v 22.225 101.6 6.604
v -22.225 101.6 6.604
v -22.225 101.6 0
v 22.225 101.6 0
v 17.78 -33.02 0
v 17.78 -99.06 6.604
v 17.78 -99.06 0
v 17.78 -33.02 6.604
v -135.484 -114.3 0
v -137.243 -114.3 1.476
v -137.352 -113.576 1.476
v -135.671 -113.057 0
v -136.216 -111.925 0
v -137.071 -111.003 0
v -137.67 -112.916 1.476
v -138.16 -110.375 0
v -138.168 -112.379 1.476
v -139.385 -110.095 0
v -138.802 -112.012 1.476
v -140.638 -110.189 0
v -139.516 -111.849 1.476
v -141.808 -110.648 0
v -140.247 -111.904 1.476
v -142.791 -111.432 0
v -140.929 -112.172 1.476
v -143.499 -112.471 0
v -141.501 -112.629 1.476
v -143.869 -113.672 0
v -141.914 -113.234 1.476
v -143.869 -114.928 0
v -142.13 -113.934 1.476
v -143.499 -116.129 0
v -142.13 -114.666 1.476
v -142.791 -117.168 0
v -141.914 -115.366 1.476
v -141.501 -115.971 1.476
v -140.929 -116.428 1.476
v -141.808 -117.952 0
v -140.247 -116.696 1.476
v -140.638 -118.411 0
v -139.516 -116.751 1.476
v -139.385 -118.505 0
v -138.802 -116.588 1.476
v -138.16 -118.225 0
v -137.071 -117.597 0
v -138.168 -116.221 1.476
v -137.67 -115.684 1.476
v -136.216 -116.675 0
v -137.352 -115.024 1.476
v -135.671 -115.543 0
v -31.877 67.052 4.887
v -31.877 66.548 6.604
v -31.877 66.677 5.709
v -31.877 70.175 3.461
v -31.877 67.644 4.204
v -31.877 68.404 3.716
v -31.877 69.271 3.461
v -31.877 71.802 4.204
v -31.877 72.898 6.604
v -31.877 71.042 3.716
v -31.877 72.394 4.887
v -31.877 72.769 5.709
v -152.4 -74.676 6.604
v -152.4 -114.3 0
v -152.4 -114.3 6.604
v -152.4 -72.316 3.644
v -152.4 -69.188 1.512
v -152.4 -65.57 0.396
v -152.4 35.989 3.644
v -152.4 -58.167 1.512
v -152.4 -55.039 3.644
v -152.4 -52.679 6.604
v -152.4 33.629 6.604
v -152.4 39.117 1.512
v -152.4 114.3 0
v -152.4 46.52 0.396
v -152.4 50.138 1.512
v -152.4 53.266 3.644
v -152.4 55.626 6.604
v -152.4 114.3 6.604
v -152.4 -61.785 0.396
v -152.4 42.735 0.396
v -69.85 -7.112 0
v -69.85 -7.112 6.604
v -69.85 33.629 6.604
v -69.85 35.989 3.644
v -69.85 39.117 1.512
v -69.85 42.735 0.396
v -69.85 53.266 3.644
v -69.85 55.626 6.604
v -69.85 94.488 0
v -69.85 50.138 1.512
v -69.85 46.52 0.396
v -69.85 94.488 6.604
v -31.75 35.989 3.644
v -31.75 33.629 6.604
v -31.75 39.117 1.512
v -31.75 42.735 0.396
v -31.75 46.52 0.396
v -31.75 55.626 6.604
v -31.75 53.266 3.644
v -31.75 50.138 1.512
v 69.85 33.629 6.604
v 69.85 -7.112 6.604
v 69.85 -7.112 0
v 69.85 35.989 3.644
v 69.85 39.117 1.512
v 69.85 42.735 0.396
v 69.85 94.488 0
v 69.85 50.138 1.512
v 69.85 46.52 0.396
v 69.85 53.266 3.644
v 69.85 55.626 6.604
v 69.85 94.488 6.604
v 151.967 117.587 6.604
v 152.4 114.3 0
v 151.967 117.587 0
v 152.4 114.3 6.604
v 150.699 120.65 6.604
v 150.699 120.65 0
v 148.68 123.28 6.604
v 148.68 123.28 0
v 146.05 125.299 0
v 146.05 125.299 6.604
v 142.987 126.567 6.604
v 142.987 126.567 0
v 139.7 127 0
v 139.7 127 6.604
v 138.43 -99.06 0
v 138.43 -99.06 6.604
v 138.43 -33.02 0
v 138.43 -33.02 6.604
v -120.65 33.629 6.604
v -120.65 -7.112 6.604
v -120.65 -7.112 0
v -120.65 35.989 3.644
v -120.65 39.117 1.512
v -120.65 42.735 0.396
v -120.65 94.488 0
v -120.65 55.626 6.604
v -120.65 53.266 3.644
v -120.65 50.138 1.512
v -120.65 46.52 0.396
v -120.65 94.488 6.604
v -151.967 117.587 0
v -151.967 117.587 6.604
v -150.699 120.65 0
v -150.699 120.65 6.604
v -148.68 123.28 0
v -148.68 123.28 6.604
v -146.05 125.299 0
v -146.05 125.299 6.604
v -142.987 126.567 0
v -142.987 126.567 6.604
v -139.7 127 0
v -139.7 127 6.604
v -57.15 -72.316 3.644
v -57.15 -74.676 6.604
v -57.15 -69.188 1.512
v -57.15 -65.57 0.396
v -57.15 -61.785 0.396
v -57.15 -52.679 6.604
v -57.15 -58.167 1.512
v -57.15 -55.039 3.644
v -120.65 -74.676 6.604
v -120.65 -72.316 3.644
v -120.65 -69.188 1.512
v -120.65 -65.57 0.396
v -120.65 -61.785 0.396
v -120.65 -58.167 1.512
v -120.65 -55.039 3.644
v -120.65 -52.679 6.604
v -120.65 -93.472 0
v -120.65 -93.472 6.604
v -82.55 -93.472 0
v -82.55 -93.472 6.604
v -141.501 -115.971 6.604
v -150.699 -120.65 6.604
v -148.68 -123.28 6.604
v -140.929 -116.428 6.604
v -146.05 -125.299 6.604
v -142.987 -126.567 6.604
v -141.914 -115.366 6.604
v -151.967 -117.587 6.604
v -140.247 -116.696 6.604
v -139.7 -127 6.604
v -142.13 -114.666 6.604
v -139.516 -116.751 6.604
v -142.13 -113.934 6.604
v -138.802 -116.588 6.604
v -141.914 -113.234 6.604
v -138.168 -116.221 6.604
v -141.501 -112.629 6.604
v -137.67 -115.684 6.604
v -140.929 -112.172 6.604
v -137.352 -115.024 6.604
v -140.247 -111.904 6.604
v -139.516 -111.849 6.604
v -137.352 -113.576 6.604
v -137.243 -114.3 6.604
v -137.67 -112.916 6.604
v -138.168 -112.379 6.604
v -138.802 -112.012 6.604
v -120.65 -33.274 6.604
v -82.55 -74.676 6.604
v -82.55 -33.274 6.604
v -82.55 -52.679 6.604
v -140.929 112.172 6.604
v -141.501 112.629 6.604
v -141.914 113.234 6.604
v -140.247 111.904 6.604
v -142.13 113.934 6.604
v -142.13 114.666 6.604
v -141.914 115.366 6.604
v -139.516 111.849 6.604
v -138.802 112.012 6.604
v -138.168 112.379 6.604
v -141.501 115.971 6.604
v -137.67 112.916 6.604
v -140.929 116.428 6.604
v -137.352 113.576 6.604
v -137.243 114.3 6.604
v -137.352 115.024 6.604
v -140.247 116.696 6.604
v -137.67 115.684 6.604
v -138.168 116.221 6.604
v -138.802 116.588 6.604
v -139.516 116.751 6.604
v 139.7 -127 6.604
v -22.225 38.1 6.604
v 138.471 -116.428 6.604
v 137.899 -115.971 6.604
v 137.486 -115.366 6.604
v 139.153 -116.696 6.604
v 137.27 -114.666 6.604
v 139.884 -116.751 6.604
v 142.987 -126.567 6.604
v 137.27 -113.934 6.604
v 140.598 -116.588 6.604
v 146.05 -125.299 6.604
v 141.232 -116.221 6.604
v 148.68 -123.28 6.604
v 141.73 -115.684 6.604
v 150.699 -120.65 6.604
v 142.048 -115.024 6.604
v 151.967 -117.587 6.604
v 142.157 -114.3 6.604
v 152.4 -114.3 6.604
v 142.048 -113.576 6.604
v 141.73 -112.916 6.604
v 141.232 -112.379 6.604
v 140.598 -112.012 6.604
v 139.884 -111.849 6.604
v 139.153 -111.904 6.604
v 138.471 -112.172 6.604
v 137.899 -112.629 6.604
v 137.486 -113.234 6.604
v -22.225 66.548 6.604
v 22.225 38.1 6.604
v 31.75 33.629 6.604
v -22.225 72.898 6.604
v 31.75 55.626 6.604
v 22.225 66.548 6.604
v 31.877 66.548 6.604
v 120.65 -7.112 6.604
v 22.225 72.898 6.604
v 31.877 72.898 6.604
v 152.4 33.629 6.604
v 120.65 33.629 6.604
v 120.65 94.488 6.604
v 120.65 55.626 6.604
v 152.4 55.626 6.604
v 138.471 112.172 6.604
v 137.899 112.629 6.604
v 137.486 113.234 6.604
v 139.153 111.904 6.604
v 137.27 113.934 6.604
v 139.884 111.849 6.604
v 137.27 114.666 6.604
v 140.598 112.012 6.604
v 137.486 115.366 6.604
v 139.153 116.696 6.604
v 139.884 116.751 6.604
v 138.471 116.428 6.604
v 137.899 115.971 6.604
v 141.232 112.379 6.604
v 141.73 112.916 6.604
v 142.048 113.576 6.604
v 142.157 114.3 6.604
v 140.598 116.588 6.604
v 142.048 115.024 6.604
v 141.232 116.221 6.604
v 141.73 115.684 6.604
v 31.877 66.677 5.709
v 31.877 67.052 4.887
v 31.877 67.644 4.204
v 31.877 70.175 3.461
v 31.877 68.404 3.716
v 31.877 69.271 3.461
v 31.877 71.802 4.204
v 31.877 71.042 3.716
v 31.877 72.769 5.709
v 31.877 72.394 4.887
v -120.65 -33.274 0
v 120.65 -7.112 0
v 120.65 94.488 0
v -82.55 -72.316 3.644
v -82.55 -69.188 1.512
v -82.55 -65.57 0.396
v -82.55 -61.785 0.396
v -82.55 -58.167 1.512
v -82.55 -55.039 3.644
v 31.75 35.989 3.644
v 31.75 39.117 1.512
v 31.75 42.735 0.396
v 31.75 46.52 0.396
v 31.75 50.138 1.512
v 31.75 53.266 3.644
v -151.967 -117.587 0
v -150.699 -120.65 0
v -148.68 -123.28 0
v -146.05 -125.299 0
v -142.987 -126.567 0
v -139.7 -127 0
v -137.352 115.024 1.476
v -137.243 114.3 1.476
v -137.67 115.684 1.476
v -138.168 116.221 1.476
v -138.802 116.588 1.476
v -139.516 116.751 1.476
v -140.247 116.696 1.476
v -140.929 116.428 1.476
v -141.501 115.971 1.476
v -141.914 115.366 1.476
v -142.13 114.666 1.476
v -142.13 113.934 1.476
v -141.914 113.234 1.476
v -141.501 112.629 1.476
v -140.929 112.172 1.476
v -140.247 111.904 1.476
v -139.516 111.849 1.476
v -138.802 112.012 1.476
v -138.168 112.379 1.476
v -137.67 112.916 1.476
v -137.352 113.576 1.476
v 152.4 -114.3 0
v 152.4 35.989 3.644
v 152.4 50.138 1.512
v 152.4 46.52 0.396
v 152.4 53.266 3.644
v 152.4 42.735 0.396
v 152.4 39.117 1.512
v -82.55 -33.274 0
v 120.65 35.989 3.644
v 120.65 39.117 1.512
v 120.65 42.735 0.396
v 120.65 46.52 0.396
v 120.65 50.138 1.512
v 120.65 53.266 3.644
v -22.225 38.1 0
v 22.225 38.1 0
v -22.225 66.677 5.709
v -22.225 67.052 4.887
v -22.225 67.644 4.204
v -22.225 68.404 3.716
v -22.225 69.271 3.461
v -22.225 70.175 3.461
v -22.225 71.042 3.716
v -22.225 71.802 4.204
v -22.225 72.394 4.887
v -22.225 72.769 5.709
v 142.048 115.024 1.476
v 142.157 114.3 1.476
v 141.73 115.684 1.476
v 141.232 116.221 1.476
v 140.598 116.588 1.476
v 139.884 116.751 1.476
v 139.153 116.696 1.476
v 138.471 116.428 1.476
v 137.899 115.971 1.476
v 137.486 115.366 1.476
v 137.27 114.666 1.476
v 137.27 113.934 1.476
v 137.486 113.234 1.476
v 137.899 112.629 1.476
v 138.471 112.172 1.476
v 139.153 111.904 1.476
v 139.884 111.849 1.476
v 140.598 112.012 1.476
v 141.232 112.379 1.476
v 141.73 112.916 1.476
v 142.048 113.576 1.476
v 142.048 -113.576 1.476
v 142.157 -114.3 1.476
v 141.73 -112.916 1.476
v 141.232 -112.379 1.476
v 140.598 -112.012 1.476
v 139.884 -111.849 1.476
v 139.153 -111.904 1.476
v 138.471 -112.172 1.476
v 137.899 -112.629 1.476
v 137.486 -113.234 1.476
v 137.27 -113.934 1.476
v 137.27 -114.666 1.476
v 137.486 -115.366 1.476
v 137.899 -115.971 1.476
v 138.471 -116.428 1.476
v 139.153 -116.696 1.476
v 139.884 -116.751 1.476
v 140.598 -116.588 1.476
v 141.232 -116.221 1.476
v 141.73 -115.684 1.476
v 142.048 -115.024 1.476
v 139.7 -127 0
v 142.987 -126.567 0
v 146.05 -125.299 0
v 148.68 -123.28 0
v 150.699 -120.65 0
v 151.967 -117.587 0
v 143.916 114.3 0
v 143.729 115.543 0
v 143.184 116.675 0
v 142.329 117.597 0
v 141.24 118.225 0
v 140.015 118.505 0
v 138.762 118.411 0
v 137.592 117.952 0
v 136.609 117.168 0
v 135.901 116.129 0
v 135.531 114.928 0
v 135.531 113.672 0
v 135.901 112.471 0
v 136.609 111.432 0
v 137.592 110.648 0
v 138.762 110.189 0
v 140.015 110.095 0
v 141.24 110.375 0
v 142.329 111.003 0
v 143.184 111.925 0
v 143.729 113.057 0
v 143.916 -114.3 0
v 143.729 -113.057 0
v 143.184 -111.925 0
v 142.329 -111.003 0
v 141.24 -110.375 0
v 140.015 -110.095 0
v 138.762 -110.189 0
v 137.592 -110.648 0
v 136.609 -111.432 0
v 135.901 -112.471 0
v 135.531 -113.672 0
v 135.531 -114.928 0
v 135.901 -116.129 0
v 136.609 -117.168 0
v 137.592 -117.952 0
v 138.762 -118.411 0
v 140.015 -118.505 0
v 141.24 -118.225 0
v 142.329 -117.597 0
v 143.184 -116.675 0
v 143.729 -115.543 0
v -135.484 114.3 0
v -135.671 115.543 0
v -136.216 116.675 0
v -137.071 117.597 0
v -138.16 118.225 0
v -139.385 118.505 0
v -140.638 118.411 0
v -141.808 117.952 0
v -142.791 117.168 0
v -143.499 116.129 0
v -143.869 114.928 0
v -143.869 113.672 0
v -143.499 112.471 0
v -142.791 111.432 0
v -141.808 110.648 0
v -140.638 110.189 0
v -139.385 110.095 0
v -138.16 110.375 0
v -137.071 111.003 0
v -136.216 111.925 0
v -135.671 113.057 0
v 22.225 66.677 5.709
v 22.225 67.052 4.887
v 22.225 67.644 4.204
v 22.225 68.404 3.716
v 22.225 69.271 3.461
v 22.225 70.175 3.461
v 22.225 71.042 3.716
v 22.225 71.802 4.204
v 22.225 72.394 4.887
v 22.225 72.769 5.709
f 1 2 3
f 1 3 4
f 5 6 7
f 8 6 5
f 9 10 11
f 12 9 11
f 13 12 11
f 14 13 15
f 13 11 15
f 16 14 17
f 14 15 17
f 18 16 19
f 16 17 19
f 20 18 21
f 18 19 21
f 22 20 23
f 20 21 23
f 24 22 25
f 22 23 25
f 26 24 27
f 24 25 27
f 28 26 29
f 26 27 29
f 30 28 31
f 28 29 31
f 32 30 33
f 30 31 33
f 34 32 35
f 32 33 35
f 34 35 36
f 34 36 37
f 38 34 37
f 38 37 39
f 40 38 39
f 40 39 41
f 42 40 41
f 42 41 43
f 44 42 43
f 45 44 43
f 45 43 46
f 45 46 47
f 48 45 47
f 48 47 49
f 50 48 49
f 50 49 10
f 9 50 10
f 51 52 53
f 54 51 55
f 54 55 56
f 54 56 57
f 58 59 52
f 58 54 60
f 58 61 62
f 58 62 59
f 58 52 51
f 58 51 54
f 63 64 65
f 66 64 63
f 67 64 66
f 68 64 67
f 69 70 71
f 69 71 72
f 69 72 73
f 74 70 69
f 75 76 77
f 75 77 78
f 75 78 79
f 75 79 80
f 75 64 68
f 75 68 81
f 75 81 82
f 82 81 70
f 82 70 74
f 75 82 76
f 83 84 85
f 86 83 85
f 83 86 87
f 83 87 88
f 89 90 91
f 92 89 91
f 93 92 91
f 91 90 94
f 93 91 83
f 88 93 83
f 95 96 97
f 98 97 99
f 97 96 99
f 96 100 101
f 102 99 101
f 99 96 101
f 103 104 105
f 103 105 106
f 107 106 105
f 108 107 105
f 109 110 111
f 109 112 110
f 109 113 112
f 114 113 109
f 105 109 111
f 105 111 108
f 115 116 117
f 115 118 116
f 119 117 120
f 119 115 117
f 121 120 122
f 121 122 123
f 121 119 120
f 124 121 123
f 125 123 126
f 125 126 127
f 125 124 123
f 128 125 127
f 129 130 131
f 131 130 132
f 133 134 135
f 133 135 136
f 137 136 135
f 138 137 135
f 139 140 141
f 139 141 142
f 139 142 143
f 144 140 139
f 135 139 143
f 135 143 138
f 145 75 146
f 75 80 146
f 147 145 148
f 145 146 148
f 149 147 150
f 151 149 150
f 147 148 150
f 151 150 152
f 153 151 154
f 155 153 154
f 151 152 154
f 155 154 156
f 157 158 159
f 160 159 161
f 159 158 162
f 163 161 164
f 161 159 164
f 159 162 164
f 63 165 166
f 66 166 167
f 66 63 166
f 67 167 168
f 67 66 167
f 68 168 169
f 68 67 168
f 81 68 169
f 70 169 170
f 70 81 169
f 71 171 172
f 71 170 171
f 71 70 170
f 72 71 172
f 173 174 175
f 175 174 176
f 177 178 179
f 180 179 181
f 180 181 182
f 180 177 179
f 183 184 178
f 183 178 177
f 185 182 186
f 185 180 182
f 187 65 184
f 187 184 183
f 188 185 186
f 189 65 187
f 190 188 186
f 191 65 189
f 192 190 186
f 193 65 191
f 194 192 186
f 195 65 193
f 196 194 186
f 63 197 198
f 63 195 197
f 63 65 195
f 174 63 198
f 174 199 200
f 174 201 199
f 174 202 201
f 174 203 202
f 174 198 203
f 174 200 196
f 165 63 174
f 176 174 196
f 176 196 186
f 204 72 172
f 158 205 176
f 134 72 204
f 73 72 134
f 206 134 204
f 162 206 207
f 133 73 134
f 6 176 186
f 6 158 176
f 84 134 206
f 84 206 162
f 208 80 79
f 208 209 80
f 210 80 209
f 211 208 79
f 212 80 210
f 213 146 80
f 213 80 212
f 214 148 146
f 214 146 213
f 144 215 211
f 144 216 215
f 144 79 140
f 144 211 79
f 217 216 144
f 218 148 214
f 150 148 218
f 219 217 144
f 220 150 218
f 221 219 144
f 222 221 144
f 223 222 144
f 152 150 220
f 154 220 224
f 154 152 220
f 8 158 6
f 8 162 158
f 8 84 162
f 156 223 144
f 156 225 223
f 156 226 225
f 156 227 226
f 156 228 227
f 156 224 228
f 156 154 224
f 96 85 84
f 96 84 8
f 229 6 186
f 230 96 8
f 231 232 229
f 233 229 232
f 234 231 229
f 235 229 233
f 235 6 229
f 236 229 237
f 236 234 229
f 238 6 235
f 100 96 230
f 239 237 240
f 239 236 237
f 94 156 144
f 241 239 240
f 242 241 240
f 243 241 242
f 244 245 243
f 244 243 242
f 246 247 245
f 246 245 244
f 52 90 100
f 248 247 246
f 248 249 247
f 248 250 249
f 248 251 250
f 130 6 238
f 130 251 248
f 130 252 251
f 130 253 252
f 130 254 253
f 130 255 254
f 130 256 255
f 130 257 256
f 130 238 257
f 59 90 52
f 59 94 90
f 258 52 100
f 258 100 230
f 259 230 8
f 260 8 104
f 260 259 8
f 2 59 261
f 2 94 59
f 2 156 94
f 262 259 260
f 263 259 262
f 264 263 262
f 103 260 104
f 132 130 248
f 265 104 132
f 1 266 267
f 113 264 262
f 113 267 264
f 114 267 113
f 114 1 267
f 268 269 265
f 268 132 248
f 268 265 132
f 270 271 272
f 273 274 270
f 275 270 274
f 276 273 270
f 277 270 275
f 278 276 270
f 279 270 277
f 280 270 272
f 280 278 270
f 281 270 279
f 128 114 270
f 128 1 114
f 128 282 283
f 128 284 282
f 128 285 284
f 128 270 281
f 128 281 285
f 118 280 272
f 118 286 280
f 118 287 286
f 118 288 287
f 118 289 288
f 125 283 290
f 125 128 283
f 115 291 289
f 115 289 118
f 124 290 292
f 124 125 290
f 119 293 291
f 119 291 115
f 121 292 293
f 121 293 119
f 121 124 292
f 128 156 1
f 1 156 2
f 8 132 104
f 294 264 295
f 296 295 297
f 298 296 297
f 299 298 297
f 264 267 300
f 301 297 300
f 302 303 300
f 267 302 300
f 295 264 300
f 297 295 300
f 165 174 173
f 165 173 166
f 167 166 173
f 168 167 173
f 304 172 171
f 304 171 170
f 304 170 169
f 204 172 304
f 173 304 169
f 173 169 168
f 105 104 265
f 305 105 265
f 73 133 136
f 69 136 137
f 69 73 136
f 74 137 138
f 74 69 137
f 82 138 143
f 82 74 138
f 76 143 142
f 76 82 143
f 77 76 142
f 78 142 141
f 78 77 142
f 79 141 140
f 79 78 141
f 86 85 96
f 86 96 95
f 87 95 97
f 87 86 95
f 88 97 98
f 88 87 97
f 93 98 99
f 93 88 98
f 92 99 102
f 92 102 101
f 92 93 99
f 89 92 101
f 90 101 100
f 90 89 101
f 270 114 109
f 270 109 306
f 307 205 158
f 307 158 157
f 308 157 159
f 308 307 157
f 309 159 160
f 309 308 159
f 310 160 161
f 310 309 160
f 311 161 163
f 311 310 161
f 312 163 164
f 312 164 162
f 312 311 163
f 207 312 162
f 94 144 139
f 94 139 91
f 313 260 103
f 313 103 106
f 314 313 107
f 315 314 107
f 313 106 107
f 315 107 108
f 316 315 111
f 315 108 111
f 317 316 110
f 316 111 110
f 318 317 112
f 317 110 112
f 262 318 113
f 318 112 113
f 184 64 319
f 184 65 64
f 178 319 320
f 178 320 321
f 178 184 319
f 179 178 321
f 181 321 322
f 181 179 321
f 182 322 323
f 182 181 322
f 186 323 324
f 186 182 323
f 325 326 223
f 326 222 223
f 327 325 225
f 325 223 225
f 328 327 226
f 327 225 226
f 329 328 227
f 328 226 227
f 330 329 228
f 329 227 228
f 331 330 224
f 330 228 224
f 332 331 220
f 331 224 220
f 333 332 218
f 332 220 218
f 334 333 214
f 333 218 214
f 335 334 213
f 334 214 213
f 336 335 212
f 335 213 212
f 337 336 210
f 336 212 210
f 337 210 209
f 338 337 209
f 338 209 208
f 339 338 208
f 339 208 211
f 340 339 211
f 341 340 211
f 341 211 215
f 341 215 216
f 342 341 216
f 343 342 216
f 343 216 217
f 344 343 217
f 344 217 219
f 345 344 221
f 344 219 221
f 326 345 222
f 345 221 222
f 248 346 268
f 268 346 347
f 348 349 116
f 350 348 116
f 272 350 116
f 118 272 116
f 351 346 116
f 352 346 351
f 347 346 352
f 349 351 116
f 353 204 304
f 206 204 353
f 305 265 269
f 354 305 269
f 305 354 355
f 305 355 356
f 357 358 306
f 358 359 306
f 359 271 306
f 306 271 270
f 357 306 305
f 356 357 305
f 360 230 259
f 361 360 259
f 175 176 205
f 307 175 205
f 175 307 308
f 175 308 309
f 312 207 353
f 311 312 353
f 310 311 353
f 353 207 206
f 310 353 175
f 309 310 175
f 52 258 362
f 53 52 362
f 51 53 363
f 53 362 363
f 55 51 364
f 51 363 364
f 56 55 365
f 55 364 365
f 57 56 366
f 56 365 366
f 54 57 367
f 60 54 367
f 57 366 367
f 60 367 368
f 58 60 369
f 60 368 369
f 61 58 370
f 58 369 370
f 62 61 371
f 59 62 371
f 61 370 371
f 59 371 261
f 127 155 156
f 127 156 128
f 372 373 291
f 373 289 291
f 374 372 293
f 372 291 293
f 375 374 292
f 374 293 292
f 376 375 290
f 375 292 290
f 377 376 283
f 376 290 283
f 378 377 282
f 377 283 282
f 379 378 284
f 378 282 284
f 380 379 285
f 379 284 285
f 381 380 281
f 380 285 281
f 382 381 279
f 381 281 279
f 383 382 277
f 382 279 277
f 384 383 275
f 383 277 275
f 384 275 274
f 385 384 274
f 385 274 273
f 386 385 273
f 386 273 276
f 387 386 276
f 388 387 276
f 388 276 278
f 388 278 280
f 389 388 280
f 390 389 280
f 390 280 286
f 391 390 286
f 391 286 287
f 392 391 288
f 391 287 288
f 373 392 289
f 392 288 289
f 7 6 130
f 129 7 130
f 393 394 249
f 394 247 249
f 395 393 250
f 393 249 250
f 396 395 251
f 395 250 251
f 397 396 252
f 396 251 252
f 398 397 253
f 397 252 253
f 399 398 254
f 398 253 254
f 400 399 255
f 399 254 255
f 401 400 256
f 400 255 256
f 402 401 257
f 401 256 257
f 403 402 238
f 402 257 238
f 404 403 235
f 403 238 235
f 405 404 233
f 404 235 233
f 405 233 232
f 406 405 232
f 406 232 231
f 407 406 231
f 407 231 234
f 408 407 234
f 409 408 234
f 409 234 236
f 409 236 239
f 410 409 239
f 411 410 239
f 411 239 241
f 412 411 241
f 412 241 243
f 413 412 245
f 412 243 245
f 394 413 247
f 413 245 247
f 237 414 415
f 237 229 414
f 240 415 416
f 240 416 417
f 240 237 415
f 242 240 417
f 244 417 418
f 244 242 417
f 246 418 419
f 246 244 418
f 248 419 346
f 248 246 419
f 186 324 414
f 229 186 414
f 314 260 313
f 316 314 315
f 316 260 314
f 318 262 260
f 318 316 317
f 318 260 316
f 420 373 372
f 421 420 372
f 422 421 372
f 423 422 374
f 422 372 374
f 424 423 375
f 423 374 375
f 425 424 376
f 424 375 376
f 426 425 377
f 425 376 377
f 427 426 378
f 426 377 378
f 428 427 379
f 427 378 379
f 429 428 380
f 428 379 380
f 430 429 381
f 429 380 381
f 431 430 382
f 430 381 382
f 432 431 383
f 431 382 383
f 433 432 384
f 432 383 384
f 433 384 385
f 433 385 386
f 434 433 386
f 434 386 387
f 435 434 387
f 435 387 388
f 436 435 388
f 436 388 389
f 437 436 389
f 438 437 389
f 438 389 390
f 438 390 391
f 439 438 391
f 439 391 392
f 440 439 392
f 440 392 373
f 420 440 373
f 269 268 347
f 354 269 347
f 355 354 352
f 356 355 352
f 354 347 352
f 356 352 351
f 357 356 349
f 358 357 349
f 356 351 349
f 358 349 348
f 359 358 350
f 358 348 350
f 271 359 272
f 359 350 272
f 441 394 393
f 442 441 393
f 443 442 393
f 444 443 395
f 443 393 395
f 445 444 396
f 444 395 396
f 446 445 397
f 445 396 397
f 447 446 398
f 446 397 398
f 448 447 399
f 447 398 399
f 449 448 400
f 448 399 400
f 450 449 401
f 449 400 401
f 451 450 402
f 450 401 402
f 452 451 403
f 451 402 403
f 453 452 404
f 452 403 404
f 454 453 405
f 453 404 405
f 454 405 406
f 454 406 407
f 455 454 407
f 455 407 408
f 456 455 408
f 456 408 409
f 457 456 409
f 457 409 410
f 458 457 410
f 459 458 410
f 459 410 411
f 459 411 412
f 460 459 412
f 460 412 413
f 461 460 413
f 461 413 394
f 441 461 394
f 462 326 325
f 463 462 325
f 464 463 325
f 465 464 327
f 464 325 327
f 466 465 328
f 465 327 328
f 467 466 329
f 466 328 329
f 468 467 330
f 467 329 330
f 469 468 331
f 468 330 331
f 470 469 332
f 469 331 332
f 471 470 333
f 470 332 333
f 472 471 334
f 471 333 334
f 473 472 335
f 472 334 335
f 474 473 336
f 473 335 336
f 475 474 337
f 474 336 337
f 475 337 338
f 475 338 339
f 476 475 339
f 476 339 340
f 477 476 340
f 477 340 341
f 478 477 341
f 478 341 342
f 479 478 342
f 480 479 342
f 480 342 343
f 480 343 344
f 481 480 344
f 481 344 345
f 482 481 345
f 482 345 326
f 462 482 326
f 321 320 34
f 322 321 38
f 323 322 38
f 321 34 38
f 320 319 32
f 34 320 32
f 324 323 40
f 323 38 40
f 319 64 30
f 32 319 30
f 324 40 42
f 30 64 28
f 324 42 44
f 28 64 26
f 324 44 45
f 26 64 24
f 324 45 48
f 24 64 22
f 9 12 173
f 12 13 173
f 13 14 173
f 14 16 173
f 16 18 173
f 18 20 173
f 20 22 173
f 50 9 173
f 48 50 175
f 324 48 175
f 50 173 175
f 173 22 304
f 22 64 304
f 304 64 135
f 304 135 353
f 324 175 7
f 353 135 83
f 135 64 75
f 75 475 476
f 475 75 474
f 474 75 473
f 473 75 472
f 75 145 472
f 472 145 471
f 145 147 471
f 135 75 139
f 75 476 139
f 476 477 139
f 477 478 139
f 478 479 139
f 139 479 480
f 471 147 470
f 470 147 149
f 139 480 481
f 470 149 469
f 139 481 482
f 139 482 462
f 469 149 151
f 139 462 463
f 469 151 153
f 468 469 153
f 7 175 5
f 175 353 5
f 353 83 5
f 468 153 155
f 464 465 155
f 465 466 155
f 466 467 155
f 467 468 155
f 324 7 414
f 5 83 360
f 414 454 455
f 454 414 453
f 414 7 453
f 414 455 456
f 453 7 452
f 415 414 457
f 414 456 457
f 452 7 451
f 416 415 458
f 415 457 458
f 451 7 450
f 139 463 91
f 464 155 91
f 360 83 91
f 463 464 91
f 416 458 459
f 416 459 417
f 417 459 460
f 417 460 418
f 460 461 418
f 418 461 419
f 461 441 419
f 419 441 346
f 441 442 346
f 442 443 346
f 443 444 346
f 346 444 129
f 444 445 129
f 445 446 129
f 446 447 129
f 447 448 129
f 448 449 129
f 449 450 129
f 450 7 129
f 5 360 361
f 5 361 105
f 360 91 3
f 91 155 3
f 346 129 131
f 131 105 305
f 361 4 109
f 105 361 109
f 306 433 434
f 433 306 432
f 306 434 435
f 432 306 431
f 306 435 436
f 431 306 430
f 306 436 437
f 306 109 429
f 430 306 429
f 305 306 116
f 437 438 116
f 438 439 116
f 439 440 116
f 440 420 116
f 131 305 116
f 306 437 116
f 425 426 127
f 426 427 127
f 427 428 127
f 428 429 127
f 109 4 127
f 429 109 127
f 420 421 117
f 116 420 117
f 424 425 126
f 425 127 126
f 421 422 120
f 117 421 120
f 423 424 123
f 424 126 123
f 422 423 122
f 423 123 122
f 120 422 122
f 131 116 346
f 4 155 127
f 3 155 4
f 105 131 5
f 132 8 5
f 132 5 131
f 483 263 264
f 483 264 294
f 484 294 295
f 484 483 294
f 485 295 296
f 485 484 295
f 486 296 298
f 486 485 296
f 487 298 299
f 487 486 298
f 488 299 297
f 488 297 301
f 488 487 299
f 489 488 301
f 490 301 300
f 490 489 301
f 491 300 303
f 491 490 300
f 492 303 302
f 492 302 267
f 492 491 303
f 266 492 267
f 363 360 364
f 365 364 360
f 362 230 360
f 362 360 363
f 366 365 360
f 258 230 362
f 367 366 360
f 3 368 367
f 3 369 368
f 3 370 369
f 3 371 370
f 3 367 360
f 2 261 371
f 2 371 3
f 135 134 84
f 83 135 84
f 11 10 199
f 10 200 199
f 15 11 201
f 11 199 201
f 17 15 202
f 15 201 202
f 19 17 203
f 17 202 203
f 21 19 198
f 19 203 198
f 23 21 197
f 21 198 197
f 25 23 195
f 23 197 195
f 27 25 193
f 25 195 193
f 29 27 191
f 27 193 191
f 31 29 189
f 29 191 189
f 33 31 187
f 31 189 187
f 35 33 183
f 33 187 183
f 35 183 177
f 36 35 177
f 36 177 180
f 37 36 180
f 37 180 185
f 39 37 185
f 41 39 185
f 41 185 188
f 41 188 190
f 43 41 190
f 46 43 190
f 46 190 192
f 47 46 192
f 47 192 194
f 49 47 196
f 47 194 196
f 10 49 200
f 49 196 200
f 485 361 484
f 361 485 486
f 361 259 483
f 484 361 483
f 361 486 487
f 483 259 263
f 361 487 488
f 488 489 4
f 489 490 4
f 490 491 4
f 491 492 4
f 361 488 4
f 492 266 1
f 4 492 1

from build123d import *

# Parameters (mm, degrees)
SKETCH1_W                                         = 304.8
SKETCH1_H                                         = 254
BOSS_EXTRUDE1_DEPTH                               = 6.604
FILLET1_R                                         = 12.7
SKETCH6_W                                         = 50.8
SKETCH6_H                                         = 101.6
SKETCH6_W_2                                       = 44.45
SKETCH6_H_2                                       = 63.5
SKETCH6_W_3                                       = 38.1
SKETCH6_H_3                                       = 60.198
SKETCH6_W_4                                       = 120.65
SKETCH6_H_4                                       = 66.04
CUT_EXTRUDE1_DEPTH                                = 7.62
CUT_EXTRUDE2_DEPTH                                = 120.65
CUT_EXTRUDE3_DEPTH                                = 95.25
CUT_EXTRUDE4_DEPTH                                = 9.652
CSK_FOR_8_FLAT_HEAD_MACHINE_SCREW_100_D           = 4.9149
CSK_FOR_8_FLAT_HEAD_MACHINE_SCREW_100_DEPTH       = 10.668
CSK_FOR_8_FLAT_HEAD_MACHINE_SCREW_100_CSINK_D     = 8.4328
CSK_FOR_8_FLAT_HEAD_MACHINE_SCREW_100_CSINK_ANGLE = 100
CSK_FOR_8_FLAT_HEAD_MACHINE_SCREW_100_TIP         = 1.476584928


with BuildPart() as part:
    # Sketch1 → Boss-Extrude1 (new body)
    with BuildSketch(Plane.XY):
        Rectangle(SKETCH1_W, SKETCH1_H)
    extrude(amount=BOSS_EXTRUDE1_DEPTH)

    # Fillet1
    fillet1_edges = [part.edges().sort_by_distance(p)[0] for p in [
        (-152.4, 127, 3.302),
        (152.4, 127, 3.302),
        (152.4, -127, 3.302),
        (-152.4, -127, 3.302),
    ]]
    fillet(fillet1_edges, radius=FILLET1_R)

    # Sketch6 → Cut-Extrude1 (cut)
    with BuildSketch(Plane.XY.offset(6.604)):
        with Locations((-95.25, 43.688)):
            Rectangle(SKETCH6_W, SKETCH6_H)
        with Locations((0, 69.85)):
            Rectangle(SKETCH6_W_2, SKETCH6_H_2)
        with Locations((-101.6, -63.373)):
            Rectangle(SKETCH6_W_3, SKETCH6_H_3)
        with Locations((95.25, 43.688)):
            Rectangle(SKETCH6_W, SKETCH6_H)
        with Locations((78.105, -66.04)):
            Rectangle(SKETCH6_W_4, SKETCH6_H_4)
    extrude(amount=-CUT_EXTRUDE1_DEPTH, mode=Mode.SUBTRACT)

    # Sketch9 → Cut-Extrude2 (cut)
    with BuildSketch(Plane.ZY.offset(152.4)):
        with BuildLine():
            Line((6.604, 55.626), (6.604, 33.628954744))
            ThreePointArc((6.604, 33.628954744), (0.254, 44.627477372), (6.604, 55.626))
        make_face()
    cut_extrude2 = extrude(amount=-CUT_EXTRUDE2_DEPTH, mode=Mode.SUBTRACT)

    # Mirror1: Cut-Extrude2 across plane
    add(cut_extrude2.mirror(Plane(origin=(0, 0, 0), x_dir=(0, 0, 1), z_dir=(1, 0, 0))), mode=Mode.SUBTRACT)

    # Sketch10 → Cut-Extrude3 (cut)
    with BuildSketch(Plane.ZY.offset(152.4)):
        with BuildLine():
            Line((6.604, -52.678954744), (6.604, -74.676))
            ThreePointArc((6.604, -74.676), (0.254, -63.677477372), (6.604, -52.678954744))
        make_face()
    extrude(amount=-CUT_EXTRUDE3_DEPTH, mode=Mode.SUBTRACT)

    # Sketch11 → Cut-Extrude4 (cut)
    with BuildSketch(Plane.ZY.offset(-22.225)):
        with BuildLine():
            Line((6.604, 72.898), (6.604, 66.548))
            ThreePointArc((6.604, 66.548), (3.429, 69.723), (6.604, 72.898))
        make_face()
    cut_extrude4 = extrude(amount=-CUT_EXTRUDE4_DEPTH, mode=Mode.SUBTRACT)

    # Mirror2: Cut-Extrude4 across plane
    add(cut_extrude4.mirror(Plane(origin=(0, 0, 0), x_dir=(0, 0, 1), z_dir=(1, 0, 0))), mode=Mode.SUBTRACT)

    # CSK for #8 Flat Head Machine Screw (100)1
    with Locations(Plane(origin=(0, 0, 0), x_dir=(-1, 0, 0), z_dir=(0, 0, -1))):
        with Locations((-139.7, 114.3), (139.7, 114.3), (139.7, -114.3), (-139.7, -114.3)):
            CounterSinkHole(CSK_FOR_8_FLAT_HEAD_MACHINE_SCREW_100_D / 2, CSK_FOR_8_FLAT_HEAD_MACHINE_SCREW_100_CSINK_D / 2, depth=CSK_FOR_8_FLAT_HEAD_MACHINE_SCREW_100_DEPTH, counter_sink_angle=CSK_FOR_8_FLAT_HEAD_MACHINE_SCREW_100_CSINK_ANGLE)
            with Locations((0, 0, -(CSK_FOR_8_FLAT_HEAD_MACHINE_SCREW_100_DEPTH + CSK_FOR_8_FLAT_HEAD_MACHINE_SCREW_100_TIP / 2))):  # 118° drill point
                Cone(0, CSK_FOR_8_FLAT_HEAD_MACHINE_SCREW_100_D / 2, CSK_FOR_8_FLAT_HEAD_MACHINE_SCREW_100_TIP, mode=Mode.SUBTRACT)


solid = part.part
